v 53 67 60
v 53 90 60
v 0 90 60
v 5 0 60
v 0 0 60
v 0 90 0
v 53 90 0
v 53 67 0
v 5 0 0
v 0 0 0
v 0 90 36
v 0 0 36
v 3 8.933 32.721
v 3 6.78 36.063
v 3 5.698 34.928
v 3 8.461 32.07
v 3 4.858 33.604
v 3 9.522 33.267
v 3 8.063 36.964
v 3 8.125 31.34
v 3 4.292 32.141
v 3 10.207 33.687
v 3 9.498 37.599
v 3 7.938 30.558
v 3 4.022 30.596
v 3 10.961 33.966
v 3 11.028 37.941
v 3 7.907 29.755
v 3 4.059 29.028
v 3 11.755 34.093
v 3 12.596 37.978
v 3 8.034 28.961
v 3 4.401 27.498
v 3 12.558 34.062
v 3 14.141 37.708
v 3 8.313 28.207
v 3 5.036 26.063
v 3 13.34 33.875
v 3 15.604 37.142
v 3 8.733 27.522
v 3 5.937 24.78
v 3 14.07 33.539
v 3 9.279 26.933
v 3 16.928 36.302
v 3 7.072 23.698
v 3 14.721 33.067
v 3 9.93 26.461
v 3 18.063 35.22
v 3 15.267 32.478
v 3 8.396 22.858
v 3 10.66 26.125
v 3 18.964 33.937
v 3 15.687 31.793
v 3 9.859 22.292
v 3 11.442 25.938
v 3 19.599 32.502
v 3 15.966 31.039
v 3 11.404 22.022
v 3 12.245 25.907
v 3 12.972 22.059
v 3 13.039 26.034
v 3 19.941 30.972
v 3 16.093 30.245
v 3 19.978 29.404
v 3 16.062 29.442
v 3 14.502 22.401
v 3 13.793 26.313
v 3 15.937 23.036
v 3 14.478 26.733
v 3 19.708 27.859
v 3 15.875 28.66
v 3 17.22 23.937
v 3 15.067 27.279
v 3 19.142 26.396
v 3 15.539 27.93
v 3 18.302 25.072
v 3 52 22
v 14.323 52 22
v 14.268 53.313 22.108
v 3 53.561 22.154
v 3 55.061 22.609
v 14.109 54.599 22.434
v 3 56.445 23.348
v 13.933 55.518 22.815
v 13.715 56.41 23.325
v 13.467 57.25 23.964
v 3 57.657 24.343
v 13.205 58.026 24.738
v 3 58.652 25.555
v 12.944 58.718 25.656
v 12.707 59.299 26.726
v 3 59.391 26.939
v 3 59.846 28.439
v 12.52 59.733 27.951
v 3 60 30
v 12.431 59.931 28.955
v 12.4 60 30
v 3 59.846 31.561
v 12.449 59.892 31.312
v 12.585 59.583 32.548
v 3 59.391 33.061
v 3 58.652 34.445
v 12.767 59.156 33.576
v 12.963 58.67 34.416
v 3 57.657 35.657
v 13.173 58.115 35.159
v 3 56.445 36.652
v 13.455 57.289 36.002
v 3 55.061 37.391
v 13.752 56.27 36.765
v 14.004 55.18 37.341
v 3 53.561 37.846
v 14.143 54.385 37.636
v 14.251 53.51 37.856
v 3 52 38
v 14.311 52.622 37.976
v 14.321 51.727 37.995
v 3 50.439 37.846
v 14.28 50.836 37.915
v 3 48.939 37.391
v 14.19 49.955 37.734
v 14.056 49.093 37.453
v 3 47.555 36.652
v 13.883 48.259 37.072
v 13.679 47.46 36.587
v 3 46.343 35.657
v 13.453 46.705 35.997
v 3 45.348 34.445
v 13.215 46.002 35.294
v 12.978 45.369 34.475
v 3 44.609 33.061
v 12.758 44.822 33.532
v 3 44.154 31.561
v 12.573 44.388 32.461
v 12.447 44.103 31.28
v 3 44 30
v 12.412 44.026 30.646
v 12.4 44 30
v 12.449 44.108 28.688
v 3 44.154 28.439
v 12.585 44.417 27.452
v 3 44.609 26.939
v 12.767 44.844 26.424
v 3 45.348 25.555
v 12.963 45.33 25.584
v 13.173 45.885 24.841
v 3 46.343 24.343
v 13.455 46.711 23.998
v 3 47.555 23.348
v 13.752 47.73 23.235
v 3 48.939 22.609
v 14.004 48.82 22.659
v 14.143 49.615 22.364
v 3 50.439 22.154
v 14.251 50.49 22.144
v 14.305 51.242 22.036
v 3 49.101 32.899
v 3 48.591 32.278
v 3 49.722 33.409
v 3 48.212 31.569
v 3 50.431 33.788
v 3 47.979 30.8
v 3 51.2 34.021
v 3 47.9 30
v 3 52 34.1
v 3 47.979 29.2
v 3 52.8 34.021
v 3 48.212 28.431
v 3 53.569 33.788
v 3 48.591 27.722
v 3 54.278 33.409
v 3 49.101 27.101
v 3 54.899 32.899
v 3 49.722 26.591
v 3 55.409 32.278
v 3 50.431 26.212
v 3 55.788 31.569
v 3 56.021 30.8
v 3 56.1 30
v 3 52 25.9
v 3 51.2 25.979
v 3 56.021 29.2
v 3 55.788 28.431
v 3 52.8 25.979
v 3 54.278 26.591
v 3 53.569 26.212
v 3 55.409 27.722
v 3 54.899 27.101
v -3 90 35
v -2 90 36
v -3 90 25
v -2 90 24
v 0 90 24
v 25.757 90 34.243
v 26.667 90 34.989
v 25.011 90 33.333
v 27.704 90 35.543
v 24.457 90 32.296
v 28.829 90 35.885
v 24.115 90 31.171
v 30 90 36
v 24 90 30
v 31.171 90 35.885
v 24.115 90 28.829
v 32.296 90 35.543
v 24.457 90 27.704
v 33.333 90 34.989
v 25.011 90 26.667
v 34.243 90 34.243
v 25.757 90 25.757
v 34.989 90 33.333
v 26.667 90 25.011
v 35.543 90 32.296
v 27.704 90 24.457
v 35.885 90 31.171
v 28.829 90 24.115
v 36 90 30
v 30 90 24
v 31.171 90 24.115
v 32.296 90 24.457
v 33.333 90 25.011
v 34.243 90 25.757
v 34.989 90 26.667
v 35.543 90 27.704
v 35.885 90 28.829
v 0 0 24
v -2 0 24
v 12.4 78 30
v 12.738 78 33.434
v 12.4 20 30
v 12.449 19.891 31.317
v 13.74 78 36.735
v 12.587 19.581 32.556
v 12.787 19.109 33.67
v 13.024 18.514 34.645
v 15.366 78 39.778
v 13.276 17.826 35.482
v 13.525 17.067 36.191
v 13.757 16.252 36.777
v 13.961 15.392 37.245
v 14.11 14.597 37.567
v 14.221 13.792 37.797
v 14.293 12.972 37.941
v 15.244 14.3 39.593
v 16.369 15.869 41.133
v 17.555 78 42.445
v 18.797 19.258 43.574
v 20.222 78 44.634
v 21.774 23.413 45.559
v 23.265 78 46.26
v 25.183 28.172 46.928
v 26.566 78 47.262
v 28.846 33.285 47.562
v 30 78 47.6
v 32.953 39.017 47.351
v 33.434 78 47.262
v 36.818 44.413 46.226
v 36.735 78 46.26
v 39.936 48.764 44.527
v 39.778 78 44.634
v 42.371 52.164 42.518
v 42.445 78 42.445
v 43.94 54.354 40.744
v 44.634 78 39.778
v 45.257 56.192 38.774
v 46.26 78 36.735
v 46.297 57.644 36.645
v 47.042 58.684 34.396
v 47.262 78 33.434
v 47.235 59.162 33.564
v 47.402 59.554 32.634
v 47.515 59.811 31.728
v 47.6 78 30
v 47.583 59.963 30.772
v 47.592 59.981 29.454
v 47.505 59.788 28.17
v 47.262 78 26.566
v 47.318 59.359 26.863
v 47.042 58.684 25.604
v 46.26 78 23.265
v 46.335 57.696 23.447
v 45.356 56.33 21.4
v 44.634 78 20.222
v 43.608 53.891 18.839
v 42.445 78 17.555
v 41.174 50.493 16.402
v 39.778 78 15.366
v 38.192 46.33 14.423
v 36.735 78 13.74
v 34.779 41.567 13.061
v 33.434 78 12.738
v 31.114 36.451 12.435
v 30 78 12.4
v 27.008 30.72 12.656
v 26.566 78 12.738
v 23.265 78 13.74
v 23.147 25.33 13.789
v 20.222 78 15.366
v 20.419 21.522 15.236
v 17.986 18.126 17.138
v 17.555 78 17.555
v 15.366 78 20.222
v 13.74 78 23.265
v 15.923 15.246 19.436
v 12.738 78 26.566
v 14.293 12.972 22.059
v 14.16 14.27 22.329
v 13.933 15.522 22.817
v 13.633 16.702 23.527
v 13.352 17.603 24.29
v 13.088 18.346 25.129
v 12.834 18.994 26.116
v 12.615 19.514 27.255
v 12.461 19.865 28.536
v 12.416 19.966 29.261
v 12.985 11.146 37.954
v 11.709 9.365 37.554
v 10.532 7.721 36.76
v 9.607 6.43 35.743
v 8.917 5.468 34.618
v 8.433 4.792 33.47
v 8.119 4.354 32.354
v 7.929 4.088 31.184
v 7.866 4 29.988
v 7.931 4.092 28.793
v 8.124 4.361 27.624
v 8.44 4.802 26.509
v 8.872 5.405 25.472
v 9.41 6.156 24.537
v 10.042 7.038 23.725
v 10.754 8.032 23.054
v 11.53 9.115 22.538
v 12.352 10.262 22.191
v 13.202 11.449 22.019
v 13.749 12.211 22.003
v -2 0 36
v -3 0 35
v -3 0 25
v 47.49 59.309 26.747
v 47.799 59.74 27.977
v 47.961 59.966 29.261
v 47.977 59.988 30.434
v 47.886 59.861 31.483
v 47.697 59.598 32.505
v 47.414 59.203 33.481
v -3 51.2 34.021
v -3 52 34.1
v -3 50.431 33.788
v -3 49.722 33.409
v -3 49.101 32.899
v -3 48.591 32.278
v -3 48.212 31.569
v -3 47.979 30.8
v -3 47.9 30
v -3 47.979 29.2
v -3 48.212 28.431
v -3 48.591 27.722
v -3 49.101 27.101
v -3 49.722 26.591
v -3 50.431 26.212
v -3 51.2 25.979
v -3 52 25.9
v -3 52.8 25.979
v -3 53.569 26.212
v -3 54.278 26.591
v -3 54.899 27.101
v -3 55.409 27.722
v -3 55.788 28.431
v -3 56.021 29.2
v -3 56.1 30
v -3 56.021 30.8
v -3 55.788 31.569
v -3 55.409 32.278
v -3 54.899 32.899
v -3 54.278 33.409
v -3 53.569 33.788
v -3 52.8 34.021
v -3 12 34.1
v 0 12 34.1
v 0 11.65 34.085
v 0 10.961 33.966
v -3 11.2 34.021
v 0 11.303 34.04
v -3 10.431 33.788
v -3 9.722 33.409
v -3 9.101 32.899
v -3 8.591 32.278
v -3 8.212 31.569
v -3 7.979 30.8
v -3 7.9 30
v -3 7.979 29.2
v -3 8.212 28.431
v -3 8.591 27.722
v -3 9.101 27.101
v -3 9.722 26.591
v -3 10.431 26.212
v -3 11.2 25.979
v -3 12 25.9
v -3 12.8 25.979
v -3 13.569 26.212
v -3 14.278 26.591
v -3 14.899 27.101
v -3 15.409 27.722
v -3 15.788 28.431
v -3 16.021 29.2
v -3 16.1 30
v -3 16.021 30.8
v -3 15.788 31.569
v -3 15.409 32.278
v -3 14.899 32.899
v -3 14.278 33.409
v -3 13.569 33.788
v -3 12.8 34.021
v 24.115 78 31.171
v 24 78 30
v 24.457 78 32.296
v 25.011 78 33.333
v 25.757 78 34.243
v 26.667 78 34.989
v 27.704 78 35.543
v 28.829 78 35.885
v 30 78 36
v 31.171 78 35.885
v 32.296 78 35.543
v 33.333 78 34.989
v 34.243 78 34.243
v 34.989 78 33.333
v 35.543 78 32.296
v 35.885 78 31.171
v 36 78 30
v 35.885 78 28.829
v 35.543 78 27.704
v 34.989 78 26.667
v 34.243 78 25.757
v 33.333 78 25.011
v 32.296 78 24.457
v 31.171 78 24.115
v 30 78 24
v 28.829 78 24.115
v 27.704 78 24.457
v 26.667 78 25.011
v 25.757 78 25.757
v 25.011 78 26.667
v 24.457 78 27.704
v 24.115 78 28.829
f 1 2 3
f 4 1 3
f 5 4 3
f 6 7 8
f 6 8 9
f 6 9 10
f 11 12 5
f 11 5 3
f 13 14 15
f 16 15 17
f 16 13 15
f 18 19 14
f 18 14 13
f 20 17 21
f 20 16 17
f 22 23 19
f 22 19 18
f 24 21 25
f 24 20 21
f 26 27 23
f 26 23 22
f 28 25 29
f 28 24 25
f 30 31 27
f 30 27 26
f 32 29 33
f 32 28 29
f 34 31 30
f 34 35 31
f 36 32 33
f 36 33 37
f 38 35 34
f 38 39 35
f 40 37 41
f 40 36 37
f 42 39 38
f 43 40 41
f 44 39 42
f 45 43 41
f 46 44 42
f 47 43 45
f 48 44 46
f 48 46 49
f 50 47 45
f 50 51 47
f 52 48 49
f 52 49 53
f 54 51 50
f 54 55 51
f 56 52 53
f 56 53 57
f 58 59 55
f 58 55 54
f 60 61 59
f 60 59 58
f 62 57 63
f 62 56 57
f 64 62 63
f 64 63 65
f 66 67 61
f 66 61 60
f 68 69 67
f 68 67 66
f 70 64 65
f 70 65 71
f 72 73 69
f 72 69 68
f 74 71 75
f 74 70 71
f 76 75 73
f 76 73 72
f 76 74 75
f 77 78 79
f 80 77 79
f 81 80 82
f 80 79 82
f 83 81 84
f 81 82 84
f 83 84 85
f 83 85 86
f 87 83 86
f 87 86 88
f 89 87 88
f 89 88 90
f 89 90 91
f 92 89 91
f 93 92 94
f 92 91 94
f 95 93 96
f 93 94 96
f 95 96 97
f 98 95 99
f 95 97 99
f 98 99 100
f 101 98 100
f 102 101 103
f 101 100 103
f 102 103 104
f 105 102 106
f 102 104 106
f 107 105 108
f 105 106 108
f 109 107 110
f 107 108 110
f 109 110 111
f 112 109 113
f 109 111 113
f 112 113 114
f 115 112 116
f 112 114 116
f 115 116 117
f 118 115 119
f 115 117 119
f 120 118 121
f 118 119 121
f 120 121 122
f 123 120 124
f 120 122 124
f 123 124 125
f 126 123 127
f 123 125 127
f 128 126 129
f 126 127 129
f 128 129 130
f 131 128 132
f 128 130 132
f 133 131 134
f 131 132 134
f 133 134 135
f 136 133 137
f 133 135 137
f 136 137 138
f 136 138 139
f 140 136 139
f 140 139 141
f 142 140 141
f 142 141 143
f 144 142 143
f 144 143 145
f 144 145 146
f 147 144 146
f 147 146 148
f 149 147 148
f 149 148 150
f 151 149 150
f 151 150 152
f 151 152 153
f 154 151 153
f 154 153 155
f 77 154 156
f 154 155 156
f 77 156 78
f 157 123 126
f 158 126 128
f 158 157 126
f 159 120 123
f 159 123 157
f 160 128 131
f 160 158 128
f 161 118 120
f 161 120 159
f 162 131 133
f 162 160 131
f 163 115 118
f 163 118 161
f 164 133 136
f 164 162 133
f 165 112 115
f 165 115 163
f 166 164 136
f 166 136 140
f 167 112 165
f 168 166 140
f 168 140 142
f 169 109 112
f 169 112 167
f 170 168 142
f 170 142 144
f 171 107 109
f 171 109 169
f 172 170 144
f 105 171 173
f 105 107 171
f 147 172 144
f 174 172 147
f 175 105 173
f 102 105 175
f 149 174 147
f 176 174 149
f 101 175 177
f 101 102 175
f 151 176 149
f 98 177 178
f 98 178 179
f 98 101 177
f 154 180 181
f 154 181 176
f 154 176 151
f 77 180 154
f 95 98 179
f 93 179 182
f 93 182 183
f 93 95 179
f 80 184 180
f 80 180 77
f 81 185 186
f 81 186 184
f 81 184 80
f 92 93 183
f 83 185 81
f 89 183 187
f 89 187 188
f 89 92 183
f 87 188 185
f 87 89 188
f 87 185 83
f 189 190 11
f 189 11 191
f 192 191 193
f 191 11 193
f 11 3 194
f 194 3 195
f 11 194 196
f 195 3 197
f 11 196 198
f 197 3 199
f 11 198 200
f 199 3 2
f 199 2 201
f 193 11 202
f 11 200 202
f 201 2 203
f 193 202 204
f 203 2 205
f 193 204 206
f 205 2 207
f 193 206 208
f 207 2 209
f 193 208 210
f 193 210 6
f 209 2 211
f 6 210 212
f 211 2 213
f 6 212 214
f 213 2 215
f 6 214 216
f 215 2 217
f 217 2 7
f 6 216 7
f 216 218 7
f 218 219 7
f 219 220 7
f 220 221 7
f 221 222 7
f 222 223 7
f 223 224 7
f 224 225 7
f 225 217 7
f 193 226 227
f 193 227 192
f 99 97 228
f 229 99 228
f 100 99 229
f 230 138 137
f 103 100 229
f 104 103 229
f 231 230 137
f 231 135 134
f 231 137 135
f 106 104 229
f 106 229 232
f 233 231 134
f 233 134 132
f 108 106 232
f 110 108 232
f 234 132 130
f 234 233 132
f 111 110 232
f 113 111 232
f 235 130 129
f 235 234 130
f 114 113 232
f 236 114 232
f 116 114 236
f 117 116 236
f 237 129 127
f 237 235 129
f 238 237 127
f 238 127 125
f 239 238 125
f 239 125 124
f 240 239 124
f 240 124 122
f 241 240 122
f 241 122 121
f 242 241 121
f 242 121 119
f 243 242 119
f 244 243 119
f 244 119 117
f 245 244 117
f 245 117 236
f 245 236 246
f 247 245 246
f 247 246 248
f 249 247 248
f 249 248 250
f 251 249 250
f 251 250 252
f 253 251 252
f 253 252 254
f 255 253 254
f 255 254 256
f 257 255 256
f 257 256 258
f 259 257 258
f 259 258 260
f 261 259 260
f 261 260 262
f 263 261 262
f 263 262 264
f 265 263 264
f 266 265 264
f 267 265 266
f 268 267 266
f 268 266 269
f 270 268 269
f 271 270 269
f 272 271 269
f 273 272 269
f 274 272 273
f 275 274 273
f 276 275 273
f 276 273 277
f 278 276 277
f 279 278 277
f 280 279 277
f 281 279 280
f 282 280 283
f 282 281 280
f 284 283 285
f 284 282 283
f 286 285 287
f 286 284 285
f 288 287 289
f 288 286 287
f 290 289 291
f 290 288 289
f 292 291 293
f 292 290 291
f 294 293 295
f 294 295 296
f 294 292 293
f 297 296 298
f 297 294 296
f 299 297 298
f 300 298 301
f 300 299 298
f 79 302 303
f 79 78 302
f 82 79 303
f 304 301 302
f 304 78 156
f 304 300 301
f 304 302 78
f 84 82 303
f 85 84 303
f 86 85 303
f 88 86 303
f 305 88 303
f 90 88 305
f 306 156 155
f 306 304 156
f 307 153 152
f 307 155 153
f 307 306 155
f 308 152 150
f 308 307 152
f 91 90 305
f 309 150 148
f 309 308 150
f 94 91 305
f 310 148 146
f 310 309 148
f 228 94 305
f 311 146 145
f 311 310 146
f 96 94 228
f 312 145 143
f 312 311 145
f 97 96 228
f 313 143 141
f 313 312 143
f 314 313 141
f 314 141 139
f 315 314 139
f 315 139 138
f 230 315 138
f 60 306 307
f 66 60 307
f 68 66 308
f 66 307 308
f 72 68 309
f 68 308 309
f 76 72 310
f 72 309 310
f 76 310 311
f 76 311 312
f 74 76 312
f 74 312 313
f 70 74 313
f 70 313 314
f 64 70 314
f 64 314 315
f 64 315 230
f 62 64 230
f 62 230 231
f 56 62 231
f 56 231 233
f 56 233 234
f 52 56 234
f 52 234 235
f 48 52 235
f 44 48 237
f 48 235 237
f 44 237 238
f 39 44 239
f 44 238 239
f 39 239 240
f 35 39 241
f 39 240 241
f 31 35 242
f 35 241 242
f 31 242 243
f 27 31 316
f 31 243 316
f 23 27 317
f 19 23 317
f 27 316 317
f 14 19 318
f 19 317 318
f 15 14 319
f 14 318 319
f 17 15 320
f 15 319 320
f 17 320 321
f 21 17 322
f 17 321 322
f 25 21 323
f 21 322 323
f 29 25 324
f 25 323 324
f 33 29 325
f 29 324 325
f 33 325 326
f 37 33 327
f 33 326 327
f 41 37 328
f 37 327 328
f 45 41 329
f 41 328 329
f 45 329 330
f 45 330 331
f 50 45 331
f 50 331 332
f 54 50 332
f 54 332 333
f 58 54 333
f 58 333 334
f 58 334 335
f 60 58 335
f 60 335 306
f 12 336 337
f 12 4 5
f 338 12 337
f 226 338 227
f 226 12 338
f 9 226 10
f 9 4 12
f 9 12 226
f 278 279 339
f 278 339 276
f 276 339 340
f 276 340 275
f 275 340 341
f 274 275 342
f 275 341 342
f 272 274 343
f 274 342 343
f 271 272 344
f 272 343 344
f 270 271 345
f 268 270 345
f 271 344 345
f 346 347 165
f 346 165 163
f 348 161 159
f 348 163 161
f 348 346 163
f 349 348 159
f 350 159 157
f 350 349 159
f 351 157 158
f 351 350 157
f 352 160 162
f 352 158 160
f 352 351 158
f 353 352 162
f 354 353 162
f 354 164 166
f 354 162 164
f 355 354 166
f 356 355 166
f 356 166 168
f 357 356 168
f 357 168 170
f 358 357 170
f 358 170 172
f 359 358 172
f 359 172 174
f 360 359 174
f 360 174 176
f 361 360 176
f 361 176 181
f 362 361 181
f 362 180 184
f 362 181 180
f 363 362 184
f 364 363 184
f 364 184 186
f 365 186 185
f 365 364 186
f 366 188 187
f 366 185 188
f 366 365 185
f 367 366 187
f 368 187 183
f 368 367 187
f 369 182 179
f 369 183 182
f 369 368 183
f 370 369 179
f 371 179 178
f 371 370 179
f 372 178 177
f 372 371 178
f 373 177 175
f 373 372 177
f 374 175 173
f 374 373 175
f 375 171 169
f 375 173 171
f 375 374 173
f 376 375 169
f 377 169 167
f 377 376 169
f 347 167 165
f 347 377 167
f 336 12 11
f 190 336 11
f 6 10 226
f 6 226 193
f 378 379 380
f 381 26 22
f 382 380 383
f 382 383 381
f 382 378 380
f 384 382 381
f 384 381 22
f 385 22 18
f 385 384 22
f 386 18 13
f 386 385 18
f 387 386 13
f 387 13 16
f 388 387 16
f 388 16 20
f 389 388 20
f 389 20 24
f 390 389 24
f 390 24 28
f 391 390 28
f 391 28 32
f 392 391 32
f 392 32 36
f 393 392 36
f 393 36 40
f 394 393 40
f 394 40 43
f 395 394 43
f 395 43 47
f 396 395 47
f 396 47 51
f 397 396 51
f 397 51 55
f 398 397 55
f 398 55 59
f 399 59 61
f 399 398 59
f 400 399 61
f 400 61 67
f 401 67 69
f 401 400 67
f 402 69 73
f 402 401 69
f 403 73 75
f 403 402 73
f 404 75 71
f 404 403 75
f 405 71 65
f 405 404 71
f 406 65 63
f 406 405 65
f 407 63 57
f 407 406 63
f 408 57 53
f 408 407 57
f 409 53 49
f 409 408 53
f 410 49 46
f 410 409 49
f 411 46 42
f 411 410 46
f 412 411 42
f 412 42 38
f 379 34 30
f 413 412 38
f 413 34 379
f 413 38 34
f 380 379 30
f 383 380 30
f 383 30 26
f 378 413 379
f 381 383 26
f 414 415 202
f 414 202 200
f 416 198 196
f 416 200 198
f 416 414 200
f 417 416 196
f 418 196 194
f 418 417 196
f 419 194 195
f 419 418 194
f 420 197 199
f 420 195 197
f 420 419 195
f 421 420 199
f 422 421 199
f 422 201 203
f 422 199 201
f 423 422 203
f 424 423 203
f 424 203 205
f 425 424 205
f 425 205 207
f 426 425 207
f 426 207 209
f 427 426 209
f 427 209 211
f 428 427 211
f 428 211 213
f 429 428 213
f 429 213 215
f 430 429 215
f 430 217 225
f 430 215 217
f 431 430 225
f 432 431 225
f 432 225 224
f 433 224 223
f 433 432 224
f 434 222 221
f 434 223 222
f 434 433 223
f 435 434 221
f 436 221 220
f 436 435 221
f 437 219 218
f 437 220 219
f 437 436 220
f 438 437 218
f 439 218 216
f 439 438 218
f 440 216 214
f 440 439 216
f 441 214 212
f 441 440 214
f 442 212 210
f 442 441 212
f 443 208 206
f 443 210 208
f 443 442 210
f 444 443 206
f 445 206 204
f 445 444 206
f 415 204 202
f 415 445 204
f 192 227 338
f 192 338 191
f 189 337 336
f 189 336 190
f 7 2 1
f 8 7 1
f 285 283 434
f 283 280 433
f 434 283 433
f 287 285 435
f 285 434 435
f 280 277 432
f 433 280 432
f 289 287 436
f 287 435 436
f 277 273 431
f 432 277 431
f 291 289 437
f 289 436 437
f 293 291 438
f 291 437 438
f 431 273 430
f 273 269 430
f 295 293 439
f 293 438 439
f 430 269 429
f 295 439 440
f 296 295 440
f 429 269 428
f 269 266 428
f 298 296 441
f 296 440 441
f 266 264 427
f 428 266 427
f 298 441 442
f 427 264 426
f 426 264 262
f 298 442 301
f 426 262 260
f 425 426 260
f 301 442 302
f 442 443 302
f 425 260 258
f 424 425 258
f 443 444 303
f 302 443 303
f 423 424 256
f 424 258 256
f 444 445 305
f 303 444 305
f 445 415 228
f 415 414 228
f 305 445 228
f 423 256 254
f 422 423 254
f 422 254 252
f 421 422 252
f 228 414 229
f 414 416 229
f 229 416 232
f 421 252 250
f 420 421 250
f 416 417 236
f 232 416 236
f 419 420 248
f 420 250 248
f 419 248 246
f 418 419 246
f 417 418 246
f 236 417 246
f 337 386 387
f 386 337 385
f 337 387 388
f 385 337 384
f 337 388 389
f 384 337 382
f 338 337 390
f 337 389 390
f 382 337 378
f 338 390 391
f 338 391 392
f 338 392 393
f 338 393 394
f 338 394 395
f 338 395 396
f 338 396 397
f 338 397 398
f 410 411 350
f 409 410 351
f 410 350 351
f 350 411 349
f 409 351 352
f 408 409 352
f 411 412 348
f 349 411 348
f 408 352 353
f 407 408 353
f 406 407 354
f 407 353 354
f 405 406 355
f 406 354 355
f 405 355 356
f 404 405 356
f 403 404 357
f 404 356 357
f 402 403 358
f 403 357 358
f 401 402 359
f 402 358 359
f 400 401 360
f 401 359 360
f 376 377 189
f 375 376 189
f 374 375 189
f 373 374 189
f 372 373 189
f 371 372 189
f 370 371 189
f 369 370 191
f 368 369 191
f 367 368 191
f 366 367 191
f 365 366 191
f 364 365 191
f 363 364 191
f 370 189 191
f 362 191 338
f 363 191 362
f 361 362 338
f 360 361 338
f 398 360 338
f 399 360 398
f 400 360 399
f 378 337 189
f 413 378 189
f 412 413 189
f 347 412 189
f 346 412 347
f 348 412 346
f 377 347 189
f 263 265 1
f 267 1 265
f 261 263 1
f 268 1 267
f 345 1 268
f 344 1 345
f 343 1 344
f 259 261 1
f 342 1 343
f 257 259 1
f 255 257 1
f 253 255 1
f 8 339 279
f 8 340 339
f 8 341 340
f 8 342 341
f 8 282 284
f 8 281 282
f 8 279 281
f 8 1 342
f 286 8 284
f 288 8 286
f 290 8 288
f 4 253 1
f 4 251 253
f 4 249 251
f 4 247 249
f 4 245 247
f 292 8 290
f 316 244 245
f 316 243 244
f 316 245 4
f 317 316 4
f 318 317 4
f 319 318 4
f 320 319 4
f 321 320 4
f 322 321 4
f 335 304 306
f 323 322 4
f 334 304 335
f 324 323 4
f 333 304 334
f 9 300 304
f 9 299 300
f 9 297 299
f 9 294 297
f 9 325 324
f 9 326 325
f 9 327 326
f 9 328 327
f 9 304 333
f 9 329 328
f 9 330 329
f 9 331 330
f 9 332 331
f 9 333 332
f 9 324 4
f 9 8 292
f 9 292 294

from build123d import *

# Parameters (mm, degrees)
BOSS_EXTRUDE1_DEPTH     = 60
CUT_EXTRUDE1_DEPTH      = 121.453310457
CUT_EXTRUDE1_DEPTH_BACK = 121.453310457
SKETCH2_R               = 6
SKETCH3_R               = 17.6
CUT_EXTRUDE2_DEPTH      = 78
CUT_EXTRUDE4_REACH      = 122.453
CUT_EXTRUDE4_END_RADIUS = 17.6
SKETCH5_R               = 4.1
CUT_EXTRUDE6_START      = 53
SKETCH6_R               = 8
CUT_EXTRUDE6_DEPTH      = 50
SKETCH7_W               = 12
SKETCH7_H               = 90
BOSS_EXTRUDE4_DEPTH     = 3
CUT_EXTRUDE7_DEPTH      = 121.453310457
CUT_EXTRUDE7_DEPTH_BACK = 121.453310457
SKETCH5_2_R             = 4.1
CHAMFER1_SIZE           = 1


with BuildPart() as part:
    # Sketch1 → Boss-Extrude1 (new body)
    with BuildSketch(Plane.XY):
        Polygon((0, 0), (0, 90), (53, 90), (53, 67), (5, 0), align=None)
    extrude(amount=BOSS_EXTRUDE1_DEPTH)

    # Sketch2 → Cut-Extrude1 (cut, two sides: drawn at the far end of the back side and taken through both)
    with BuildSketch(Plane(origin=(0, 0, 0), x_dir=(1, 0, 0), z_dir=(0, 1, 0)).offset(-CUT_EXTRUDE1_DEPTH_BACK)):
        with Locations(Location((30, -30, 0), (0, 0, 180))):
            Circle(SKETCH2_R)
    extrude(amount=CUT_EXTRUDE1_DEPTH + CUT_EXTRUDE1_DEPTH_BACK, mode=Mode.SUBTRACT)

    # Sketch3 → Cut-Extrude2 (cut)
    with BuildSketch(Plane(origin=(0, 0, 0), x_dir=(1, 0, 0), z_dir=(0, 1, 0))):
        with Locations(Location((30, -30, 0), (0, 0, 180))):
            Circle(SKETCH3_R)
    extrude(amount=CUT_EXTRUDE2_DEPTH, mode=Mode.SUBTRACT)

    # Cut-Extrude4: up to this cylinder (the profile starts outside it)
    cut_extrude4_end = Plane(origin=(30, 32, 30), z_dir=(0, -1, 0)) * Cylinder(CUT_EXTRUDE4_END_RADIUS, 321.106, mode=Mode.PRIVATE)
    # Sketch5 → Cut-Extrude4 (cut, up to the surface)
    with BuildSketch(Plane(origin=(0, 0, 0), x_dir=(0, 0, -1), z_dir=(1, 0, 0)), mode=Mode.PRIVATE) as cut_extrude4_sk1:
        with Locations(Location((-30, 12, 0), (0, 0, 194.678469959))):
            Circle(SKETCH5_R)
    cut_extrude4_tool1 = extrude(cut_extrude4_sk1.sketch, amount=CUT_EXTRUDE4_REACH, mode=Mode.PRIVATE) - cut_extrude4_end
    add(cut_extrude4_tool1.solids().sort_by_distance((0, 12, 30))[0], mode=Mode.SUBTRACT)
    # Sketch5 → Cut-Extrude4 (cut, up to the surface)
    with BuildSketch(Plane(origin=(0, 0, 0), x_dir=(0, 0, -1), z_dir=(1, 0, 0)), mode=Mode.PRIVATE) as cut_extrude4_sk2:
        with Locations(Location((-30, 52, 0), (0, 0, 180))):
            Circle(SKETCH5_R)
    cut_extrude4_tool2 = extrude(cut_extrude4_sk2.sketch, amount=CUT_EXTRUDE4_REACH, mode=Mode.PRIVATE) - cut_extrude4_end
    add(cut_extrude4_tool2.solids().sort_by_distance((0, 52, 30))[0], mode=Mode.SUBTRACT)

    # Sketch6 → Cut-Extrude6 (cut)
    with BuildSketch(Plane(origin=(0, 0, 0), x_dir=(0, 0, -1), z_dir=(1, 0, 0)).offset(CUT_EXTRUDE6_START)):
        with Locations((-30, 52)):
            Circle(SKETCH6_R)
        with Locations(Location((-30, 12, 0), (0, 0, 6.976713047))):
            Circle(SKETCH6_R)
    extrude(amount=-CUT_EXTRUDE6_DEPTH, mode=Mode.SUBTRACT)

    # Sketch7 → Boss-Extrude4 (add)
    with BuildSketch(Plane(origin=(0, 0, 0), x_dir=(0, 0, -1), z_dir=(1, 0, 0))):
        with Locations((-30, 45)):
            Rectangle(SKETCH7_W, SKETCH7_H)
    extrude(amount=-BOSS_EXTRUDE4_DEPTH)

    # Sketch5<2> → Cut-Extrude7 (cut, two sides: drawn at the far end of the back side and taken through both)
    with BuildSketch(Plane(origin=(0, 0, 0), x_dir=(0, 0, -1), z_dir=(1, 0, 0)).offset(-CUT_EXTRUDE7_DEPTH_BACK)):
        with Locations(Location((-30, 12, 0), (0, 0, 180))):
            Circle(SKETCH5_2_R)
        with Locations(Location((-30, 52, 0), (0, 0, 180))):
            Circle(SKETCH5_2_R)
    extrude(amount=CUT_EXTRUDE7_DEPTH + CUT_EXTRUDE7_DEPTH_BACK, mode=Mode.SUBTRACT)

    # Chamfer1
    chamfer1_edges = [part.edges().sort_by_distance(p)[0] for p in [
        (-3, 45, 36),
        (-3, 45, 24),
    ]]
    chamfer(chamfer1_edges, length=CHAMFER1_SIZE)


solid = part.part
